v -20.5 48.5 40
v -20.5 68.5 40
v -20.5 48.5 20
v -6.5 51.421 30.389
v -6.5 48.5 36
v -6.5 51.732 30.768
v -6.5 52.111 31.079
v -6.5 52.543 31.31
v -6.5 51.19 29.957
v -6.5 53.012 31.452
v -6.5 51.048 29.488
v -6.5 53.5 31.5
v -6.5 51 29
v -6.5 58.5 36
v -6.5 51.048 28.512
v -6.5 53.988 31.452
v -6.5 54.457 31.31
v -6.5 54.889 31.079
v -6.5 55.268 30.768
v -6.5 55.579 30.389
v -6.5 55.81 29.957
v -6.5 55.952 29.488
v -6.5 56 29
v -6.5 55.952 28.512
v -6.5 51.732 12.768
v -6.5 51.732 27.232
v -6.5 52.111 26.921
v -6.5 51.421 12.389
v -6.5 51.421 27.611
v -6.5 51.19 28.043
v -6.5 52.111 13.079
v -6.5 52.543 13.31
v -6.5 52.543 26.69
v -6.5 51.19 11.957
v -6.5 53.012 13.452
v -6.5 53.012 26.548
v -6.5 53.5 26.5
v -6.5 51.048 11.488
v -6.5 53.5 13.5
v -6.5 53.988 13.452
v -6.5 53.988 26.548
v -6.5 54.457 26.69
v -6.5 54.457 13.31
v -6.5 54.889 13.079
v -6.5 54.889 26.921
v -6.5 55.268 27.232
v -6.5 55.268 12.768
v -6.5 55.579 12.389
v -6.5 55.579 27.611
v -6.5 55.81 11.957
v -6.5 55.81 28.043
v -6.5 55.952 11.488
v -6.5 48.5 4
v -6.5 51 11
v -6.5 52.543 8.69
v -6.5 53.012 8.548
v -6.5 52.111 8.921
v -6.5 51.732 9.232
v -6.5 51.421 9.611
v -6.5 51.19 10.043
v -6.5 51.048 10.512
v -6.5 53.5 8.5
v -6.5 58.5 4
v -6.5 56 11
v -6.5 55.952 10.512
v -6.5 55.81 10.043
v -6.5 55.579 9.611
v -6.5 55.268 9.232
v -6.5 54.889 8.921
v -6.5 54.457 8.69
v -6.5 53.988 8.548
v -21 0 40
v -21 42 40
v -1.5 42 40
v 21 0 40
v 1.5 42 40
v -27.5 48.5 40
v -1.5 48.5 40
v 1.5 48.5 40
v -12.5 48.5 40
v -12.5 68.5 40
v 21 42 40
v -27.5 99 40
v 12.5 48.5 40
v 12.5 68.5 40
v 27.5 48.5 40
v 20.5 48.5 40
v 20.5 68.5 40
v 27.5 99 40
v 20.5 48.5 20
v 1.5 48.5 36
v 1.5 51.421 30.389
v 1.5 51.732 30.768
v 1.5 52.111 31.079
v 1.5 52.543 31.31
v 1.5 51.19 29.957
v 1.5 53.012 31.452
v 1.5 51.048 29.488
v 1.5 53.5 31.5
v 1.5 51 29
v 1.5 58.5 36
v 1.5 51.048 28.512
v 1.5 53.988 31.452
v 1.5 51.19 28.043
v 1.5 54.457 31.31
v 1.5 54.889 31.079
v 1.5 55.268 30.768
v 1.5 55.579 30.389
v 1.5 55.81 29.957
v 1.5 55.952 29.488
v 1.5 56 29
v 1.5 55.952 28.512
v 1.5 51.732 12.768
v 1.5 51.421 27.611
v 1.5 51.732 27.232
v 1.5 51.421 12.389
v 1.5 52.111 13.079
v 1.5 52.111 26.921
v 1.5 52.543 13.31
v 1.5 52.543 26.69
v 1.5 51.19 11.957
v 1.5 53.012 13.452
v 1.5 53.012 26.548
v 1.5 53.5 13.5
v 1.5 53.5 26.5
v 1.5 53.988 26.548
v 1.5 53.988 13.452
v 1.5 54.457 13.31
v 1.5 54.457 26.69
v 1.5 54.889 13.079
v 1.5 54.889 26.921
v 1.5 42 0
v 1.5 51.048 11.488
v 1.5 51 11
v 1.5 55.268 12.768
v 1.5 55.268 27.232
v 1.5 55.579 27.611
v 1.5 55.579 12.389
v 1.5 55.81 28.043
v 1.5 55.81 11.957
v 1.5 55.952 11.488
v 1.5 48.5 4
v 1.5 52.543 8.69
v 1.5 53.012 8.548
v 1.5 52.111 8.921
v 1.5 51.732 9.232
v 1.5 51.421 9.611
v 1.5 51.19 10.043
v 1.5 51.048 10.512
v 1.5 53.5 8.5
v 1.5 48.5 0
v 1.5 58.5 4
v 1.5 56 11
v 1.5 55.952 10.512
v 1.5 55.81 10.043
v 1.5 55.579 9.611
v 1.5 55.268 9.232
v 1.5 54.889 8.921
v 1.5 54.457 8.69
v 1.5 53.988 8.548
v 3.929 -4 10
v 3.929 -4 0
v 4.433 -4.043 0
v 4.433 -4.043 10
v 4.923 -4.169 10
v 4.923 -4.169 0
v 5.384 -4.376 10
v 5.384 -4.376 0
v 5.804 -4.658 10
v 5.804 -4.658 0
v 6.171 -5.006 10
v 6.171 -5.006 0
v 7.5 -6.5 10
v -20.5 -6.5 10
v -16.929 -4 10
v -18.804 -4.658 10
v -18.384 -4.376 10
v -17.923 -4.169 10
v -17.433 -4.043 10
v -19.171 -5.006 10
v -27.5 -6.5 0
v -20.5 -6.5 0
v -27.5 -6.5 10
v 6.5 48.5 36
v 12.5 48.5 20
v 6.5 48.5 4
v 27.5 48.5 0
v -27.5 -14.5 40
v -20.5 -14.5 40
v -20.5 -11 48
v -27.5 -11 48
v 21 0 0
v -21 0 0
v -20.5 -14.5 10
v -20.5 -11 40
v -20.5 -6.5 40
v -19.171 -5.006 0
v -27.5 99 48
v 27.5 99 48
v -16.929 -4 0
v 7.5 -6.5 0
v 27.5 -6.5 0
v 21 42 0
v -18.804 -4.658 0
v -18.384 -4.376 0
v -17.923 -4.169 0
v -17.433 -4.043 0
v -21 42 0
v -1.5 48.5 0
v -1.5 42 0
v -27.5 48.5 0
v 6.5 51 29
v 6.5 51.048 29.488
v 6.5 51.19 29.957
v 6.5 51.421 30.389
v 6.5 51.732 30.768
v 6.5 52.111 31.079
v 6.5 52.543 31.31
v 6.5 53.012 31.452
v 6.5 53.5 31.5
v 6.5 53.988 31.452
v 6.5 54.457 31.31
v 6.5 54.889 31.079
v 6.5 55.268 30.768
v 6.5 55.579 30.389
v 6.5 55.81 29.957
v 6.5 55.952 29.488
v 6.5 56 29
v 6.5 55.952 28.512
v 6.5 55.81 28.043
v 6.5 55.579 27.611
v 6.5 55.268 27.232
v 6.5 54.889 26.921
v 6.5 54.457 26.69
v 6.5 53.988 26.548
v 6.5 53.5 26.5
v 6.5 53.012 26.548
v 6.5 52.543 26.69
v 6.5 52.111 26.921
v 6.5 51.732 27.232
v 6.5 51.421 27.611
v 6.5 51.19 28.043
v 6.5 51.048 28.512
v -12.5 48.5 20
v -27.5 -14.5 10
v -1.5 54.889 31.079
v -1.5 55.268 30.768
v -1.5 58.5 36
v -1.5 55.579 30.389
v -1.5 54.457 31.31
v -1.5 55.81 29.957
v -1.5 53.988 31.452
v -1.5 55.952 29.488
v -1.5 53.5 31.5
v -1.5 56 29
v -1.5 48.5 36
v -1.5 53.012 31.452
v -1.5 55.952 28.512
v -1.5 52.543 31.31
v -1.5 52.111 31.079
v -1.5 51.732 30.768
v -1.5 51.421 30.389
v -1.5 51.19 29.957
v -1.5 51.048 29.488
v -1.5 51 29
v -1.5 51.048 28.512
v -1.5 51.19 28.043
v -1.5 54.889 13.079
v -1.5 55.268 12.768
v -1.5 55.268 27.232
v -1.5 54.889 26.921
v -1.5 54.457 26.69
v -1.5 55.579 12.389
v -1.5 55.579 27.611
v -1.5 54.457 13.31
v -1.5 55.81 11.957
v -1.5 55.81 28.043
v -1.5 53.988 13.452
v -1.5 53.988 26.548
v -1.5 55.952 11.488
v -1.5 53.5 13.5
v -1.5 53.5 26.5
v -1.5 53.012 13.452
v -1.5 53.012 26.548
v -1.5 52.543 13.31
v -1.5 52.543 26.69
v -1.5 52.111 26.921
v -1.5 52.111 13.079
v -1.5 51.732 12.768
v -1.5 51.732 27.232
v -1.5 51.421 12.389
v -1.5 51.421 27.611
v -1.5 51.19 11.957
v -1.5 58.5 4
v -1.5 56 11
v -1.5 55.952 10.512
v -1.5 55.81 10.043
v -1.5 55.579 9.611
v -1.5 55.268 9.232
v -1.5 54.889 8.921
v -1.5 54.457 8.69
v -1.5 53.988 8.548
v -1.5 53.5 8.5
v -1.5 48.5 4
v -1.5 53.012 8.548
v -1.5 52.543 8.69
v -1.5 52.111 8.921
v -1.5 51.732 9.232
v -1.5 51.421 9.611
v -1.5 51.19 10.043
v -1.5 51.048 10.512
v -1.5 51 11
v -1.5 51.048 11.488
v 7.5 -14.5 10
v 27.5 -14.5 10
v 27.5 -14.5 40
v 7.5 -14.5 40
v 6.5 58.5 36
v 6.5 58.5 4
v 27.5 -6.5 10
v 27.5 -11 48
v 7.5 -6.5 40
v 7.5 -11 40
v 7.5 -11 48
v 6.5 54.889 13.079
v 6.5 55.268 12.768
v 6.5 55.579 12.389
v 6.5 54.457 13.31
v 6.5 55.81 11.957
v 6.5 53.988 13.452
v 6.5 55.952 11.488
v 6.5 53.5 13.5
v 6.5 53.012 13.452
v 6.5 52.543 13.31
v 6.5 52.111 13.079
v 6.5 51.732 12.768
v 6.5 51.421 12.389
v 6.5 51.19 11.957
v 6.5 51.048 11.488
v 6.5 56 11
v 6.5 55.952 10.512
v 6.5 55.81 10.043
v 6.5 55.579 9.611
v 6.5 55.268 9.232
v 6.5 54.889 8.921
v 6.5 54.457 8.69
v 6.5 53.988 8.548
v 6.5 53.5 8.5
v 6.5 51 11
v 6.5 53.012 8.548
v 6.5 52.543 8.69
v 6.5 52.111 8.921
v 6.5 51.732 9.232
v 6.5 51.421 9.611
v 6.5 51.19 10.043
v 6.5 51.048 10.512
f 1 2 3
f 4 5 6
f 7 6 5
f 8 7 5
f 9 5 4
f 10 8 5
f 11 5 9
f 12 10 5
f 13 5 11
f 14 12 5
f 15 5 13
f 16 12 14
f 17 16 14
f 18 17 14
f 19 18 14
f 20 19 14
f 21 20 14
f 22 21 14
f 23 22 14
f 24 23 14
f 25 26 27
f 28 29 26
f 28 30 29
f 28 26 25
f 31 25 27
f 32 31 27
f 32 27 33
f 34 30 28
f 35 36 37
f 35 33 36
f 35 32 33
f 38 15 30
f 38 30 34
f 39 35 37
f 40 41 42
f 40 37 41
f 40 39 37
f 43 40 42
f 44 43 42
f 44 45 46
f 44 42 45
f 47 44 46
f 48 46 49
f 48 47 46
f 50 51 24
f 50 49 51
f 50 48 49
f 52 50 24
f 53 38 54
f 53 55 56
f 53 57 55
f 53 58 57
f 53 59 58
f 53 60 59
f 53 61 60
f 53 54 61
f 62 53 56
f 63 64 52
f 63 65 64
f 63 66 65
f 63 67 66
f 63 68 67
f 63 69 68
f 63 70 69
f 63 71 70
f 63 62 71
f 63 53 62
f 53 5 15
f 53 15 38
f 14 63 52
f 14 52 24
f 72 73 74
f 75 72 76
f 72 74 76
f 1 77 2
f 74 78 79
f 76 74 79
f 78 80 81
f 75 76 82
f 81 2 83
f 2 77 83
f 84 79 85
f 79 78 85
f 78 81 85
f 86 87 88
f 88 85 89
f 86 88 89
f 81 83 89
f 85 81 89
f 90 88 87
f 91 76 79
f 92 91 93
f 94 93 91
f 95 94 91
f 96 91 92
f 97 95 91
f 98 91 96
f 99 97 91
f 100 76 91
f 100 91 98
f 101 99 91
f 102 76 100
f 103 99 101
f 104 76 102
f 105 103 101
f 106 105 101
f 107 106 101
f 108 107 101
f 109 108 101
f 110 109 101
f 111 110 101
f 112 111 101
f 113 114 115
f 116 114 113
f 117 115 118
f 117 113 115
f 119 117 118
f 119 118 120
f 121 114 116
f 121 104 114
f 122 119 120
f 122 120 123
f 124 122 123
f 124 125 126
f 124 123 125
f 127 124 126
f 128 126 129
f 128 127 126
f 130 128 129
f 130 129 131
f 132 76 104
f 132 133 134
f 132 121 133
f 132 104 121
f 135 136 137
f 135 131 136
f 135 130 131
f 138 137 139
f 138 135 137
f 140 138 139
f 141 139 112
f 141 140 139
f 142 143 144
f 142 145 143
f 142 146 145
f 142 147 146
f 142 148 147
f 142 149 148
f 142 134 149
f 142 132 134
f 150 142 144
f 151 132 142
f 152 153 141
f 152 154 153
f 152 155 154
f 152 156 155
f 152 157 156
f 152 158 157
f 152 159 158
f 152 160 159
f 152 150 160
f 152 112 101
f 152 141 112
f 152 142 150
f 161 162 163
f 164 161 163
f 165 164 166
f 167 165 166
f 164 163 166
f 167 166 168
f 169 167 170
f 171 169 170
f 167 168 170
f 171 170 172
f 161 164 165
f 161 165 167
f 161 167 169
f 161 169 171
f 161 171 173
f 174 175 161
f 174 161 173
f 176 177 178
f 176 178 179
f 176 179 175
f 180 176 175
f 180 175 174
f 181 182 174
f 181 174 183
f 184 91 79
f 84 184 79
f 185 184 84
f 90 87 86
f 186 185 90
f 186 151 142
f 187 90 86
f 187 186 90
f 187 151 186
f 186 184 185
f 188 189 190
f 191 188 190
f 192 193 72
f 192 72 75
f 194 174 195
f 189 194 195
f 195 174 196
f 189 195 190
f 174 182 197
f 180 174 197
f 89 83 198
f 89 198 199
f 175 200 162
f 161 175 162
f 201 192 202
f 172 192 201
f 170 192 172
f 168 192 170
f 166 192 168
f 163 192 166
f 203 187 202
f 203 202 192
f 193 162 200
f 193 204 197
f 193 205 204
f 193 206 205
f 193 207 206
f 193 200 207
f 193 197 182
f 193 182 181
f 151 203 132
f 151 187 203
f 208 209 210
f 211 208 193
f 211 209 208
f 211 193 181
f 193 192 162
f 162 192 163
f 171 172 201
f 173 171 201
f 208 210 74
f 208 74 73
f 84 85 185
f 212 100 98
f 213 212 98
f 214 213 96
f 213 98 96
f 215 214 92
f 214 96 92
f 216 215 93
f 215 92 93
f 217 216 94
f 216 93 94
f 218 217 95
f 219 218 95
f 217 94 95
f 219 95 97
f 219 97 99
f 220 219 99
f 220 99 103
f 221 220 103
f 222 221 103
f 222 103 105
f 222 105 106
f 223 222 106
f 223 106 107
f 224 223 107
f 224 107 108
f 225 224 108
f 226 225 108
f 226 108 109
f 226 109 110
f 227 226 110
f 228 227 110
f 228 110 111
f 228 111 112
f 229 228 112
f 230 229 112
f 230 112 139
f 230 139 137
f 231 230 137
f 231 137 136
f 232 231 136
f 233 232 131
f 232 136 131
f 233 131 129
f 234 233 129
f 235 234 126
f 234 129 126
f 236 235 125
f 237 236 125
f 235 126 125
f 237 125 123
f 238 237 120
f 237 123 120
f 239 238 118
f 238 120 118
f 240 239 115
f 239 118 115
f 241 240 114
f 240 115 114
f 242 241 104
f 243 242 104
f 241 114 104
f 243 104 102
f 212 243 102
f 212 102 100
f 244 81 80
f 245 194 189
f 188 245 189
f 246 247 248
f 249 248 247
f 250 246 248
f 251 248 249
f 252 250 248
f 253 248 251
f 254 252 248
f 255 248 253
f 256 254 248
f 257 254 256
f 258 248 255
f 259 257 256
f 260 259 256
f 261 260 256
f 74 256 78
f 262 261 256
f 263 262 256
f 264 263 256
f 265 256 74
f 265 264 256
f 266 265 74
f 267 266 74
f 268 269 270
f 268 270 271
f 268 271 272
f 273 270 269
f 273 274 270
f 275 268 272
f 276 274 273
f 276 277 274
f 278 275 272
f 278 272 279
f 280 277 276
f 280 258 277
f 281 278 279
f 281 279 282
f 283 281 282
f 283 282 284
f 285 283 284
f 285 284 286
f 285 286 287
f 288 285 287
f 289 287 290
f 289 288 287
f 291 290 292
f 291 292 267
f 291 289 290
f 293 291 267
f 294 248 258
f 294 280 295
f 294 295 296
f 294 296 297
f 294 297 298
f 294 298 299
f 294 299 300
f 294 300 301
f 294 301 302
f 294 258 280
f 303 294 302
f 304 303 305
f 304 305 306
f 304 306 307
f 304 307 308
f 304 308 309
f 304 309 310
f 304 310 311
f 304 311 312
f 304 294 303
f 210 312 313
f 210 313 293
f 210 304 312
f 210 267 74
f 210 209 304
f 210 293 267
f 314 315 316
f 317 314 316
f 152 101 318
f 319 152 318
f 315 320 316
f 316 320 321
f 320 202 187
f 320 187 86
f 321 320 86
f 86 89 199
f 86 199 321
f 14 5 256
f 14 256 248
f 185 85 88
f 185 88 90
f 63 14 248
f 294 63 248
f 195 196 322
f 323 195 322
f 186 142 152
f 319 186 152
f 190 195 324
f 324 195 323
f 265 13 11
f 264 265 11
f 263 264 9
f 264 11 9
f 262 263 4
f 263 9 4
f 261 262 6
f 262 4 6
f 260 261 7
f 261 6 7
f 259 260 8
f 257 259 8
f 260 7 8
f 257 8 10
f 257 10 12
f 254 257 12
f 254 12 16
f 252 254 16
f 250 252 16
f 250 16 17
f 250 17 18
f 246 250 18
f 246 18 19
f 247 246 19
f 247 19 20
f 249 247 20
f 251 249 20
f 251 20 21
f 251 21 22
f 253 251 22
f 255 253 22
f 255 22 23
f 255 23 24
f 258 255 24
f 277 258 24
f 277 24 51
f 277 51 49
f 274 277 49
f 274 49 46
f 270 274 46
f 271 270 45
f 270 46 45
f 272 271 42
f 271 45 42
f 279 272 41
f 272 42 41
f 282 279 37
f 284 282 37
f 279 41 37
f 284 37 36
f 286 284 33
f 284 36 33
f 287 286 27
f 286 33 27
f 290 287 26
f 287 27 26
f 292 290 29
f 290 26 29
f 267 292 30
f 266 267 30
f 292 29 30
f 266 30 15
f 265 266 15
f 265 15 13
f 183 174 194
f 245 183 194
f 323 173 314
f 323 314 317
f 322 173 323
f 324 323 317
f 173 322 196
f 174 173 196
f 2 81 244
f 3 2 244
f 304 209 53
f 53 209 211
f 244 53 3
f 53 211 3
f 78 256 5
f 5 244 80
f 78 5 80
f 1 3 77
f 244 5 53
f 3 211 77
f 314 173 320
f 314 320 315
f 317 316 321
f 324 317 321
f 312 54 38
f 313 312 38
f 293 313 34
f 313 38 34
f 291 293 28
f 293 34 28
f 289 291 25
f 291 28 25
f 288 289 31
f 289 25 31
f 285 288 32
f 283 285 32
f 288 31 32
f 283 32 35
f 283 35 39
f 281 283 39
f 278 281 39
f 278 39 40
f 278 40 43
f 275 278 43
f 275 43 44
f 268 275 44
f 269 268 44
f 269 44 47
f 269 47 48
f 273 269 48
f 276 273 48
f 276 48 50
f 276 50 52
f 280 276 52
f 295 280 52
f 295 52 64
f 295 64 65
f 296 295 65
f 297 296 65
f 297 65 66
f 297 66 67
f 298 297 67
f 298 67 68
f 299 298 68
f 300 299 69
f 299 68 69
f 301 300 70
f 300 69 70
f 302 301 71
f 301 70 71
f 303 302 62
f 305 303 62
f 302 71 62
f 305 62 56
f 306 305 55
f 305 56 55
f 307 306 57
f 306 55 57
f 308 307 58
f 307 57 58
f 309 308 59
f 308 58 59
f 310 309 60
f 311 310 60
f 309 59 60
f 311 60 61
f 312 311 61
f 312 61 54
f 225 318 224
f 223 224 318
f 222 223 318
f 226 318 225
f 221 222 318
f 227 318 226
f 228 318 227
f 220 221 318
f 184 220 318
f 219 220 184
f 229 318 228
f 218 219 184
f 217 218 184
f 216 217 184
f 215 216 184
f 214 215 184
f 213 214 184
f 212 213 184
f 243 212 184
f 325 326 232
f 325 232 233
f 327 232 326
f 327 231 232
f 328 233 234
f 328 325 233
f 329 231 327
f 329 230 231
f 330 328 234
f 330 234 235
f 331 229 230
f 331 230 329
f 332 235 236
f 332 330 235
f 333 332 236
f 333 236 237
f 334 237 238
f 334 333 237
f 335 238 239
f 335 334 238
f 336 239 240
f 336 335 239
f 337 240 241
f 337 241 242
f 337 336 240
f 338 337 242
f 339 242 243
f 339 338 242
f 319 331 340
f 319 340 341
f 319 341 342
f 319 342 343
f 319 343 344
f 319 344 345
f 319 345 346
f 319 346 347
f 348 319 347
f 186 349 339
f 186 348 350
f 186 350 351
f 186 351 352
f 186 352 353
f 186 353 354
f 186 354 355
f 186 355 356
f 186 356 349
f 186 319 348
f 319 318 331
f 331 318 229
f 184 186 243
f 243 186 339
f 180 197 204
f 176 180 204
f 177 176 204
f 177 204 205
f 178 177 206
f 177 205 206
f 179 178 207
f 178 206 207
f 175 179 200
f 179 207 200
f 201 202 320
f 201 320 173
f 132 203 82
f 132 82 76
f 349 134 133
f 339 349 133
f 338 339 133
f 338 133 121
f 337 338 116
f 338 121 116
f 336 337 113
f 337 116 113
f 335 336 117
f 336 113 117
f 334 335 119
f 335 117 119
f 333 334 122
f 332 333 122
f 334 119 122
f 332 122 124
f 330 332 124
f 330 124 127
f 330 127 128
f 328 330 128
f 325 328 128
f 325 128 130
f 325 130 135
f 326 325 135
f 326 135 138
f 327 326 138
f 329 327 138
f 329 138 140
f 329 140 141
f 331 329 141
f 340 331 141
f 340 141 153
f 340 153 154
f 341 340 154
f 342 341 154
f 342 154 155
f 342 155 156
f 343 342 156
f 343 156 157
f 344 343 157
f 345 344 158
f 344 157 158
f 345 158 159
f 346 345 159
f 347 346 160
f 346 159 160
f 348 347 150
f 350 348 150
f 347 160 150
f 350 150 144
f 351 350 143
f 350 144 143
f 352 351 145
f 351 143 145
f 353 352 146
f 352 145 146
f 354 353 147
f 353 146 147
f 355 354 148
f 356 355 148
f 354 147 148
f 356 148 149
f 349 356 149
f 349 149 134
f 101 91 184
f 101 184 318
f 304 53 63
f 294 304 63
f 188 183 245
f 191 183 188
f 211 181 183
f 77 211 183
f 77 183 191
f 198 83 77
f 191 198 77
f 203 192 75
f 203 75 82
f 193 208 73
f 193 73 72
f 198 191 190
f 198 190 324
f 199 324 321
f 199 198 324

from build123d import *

# Parameters (mm, degrees)
BOSS_EXTRUDE1_DEPTH  = 40
CUT_EXTRUDE1_REACH   = 80.602
SKETCH2_R            = 2.5
CUT_EXTRUDE2_DEPTH   = 10
SKETCH6_W            = 55
SKETCH6_H            = 110
BOSS_EXTRUDE8_DEPTH  = 8
CUT_EXTRUDE3_REACH   = 117.156
SKETCH7_W            = 4
SKETCH7_H            = 10
BOSS_EXTRUDE9_DEPTH  = 20
BOSS_EXTRUDE10_START = -48
BOSS_EXTRUDE10_DEPTH = 7
RIB1_REACH           = 120.495
SKETCH10_WALL_W      = 267.27372249
SKETCH10_WALL_H      = 8


with BuildPart() as part:
    # Sketch1 → Boss-Extrude1 (new body)
    with BuildSketch(Plane.XY):
        Polygon((-21, 0), (21, 0), (21, 42), (1.5, 42), (1.5, 58.5), (6.5, 58.5), (6.5, 48.5), (27.5, 48.5), (27.5, -6.5), (-27.5, -6.5), (-27.5, 48.5), (-6.5, 48.5), (-6.5, 58.5), (-1.5, 58.5), (-1.5, 42), (-21, 42), align=None)
    extrude(amount=BOSS_EXTRUDE1_DEPTH)

    # Cut-Extrude1: up to this face of the body (flat: up to its plane)
    cut_extrude1_end = Plane(part.part.faces().sort_by_distance((6.5, 53.5, 20))[0])
    # Sketch2 → Cut-Extrude1 (cut, up to the picked face)
    with BuildSketch(Plane.ZY.offset(6.5), mode=Mode.PRIVATE) as cut_extrude1_sk1:
        with Locations(Location((11, 53.5, 0), (0, 0, 270))):
            Circle(SKETCH2_R)
    cut_extrude1_tool1 = split(extrude(cut_extrude1_sk1.sketch, amount=-CUT_EXTRUDE1_REACH, mode=Mode.PRIVATE), bisect_by=cut_extrude1_end, keep=Keep.BOTH, mode=Mode.PRIVATE)
    # Sketch2 → Cut-Extrude1 (cut, up to the picked face)
    with BuildSketch(Plane.ZY.offset(6.5), mode=Mode.PRIVATE) as cut_extrude1_sk2:
        with Locations(Location((29, 53.5, 0), (0, 0, 270))):
            Circle(SKETCH2_R)
    cut_extrude1_tool2 = split(extrude(cut_extrude1_sk2.sketch, amount=-CUT_EXTRUDE1_REACH, mode=Mode.PRIVATE), bisect_by=cut_extrude1_end, keep=Keep.BOTH, mode=Mode.PRIVATE)
    add(cut_extrude1_tool1.solids().sort_by(Axis((-6.5, 53.5, 11), (1, 0, 0)))[0], mode=Mode.SUBTRACT)
    add(cut_extrude1_tool2.solids().sort_by(Axis((-6.5, 53.5, 29), (1, 0, 0)))[0], mode=Mode.SUBTRACT)

    # Sketch3 → Cut-Extrude2 (cut)
    with BuildSketch(Plane(origin=(0, 0, 0), x_dir=(-1, 0, 0), z_dir=(0, 0, -1))):
        with BuildLine():
            Line((20.5, -6.5), (19.170549473, -5.005824209))
            ThreePointArc((19.170549473, -5.005824209), (18.157592064, -4.262982703), (16.929285786, -4))
            Line((16.929285786, -4), (-3.929285786, -4))
            ThreePointArc((-3.929285786, -4), (-5.157592064, -4.262982703), (-6.170549473, -5.005824209))
            Line((-6.170549473, -5.005824209), (-7.5, -6.5))
            Line((-7.5, -6.5), (20.5, -6.5))
        make_face()
    extrude(amount=-CUT_EXTRUDE2_DEPTH, mode=Mode.SUBTRACT)

    # Cut-Extrude3: up to this face of the body (flat: up to its plane)
    cut_extrude3_end = Plane(part.part.faces().sort_by_distance((6.5, 53.5, 20))[0])
    # Sketch7 → Cut-Extrude3 (cut, up to the picked face)
    with BuildSketch(Plane.ZY.offset(6.5), mode=Mode.PRIVATE) as cut_extrude3_sk1:
        with Locations((38, 53.5)):
            Rectangle(SKETCH7_W, SKETCH7_H)
    cut_extrude3_tool1 = split(extrude(cut_extrude3_sk1.sketch, amount=-CUT_EXTRUDE3_REACH, mode=Mode.PRIVATE), bisect_by=cut_extrude3_end, keep=Keep.BOTH, mode=Mode.PRIVATE)
    # Sketch7 → Cut-Extrude3 (cut, up to the picked face)
    with BuildSketch(Plane.ZY.offset(6.5), mode=Mode.PRIVATE) as cut_extrude3_sk2:
        with Locations((2, 53.5)):
            Rectangle(SKETCH7_W, SKETCH7_H)
    cut_extrude3_tool2 = split(extrude(cut_extrude3_sk2.sketch, amount=-CUT_EXTRUDE3_REACH, mode=Mode.PRIVATE), bisect_by=cut_extrude3_end, keep=Keep.BOTH, mode=Mode.PRIVATE)
    add(cut_extrude3_tool1.solids().sort_by(Axis((-6.5, 53.5, 38), (1, 0, 0)))[0], mode=Mode.SUBTRACT)
    add(cut_extrude3_tool2.solids().sort_by(Axis((-6.5, 53.5, 2), (1, 0, 0)))[0], mode=Mode.SUBTRACT)



with BuildPart() as body_2:
    # Sketch6 → Boss-Extrude8 (new body)
    with BuildSketch(Plane.XY.offset(40)):
        with Locations((0, 44)):
            Rectangle(SKETCH6_W, SKETCH6_H)
    extrude(amount=BOSS_EXTRUDE8_DEPTH)


with BuildPart() as part_1:
    add(part.part)

    add(body_2.part)  # Boss-Extrude9 merges body 2
    # Sketch9 → Boss-Extrude9 (add)
    with BuildSketch(Plane(origin=(27.5, 0, 0), x_dir=(0, 0, -1), z_dir=(1, 0, 0))):
        Polygon((-40, -14.5), (-48, -11), (-40, -11), (-40, -6.5), (-10, -6.5), (-10, -14.5), align=None)
    extrude(amount=-BOSS_EXTRUDE9_DEPTH)

    # Sketch9<2> → Boss-Extrude10 (add)
    with BuildSketch(Plane(origin=(27.5, 0, 0), x_dir=(0, 0, -1), z_dir=(1, 0, 0)).offset(BOSS_EXTRUDE10_START)):
        Polygon((-40, -14.5), (-48, -11), (-40, -11), (-40, -6.5), (-10, -6.5), (-10, -14.5), align=None)
    extrude(amount=-BOSS_EXTRUDE10_DEPTH)

    # Sketch10 wall → Rib1 (add, up to next)
    with BuildSketch(Plane(origin=(16.5, 58.5, 30), x_dir=(0, -0.707106781187, -0.707106781187), z_dir=(0, 0.707106781187, -0.707106781187)), mode=Mode.PRIVATE) as rib1_sk1:
        Rectangle(SKETCH10_WALL_W, SKETCH10_WALL_H)
    rib1_tool1 = extrude(rib1_sk1.sketch, amount=-RIB1_REACH, mode=Mode.PRIVATE) - part_1.part
    rib1 = rib1_tool1.solids().sort_by_distance((16.5, 58.5, 30))[0]
    add(rib1)

    # Mirror1: Rib1 across plane
    add(rib1.mirror(Plane(origin=(0, 0, 0), x_dir=(0, 0, 1), z_dir=(1, 0, 0))))


solid = part_1.part
